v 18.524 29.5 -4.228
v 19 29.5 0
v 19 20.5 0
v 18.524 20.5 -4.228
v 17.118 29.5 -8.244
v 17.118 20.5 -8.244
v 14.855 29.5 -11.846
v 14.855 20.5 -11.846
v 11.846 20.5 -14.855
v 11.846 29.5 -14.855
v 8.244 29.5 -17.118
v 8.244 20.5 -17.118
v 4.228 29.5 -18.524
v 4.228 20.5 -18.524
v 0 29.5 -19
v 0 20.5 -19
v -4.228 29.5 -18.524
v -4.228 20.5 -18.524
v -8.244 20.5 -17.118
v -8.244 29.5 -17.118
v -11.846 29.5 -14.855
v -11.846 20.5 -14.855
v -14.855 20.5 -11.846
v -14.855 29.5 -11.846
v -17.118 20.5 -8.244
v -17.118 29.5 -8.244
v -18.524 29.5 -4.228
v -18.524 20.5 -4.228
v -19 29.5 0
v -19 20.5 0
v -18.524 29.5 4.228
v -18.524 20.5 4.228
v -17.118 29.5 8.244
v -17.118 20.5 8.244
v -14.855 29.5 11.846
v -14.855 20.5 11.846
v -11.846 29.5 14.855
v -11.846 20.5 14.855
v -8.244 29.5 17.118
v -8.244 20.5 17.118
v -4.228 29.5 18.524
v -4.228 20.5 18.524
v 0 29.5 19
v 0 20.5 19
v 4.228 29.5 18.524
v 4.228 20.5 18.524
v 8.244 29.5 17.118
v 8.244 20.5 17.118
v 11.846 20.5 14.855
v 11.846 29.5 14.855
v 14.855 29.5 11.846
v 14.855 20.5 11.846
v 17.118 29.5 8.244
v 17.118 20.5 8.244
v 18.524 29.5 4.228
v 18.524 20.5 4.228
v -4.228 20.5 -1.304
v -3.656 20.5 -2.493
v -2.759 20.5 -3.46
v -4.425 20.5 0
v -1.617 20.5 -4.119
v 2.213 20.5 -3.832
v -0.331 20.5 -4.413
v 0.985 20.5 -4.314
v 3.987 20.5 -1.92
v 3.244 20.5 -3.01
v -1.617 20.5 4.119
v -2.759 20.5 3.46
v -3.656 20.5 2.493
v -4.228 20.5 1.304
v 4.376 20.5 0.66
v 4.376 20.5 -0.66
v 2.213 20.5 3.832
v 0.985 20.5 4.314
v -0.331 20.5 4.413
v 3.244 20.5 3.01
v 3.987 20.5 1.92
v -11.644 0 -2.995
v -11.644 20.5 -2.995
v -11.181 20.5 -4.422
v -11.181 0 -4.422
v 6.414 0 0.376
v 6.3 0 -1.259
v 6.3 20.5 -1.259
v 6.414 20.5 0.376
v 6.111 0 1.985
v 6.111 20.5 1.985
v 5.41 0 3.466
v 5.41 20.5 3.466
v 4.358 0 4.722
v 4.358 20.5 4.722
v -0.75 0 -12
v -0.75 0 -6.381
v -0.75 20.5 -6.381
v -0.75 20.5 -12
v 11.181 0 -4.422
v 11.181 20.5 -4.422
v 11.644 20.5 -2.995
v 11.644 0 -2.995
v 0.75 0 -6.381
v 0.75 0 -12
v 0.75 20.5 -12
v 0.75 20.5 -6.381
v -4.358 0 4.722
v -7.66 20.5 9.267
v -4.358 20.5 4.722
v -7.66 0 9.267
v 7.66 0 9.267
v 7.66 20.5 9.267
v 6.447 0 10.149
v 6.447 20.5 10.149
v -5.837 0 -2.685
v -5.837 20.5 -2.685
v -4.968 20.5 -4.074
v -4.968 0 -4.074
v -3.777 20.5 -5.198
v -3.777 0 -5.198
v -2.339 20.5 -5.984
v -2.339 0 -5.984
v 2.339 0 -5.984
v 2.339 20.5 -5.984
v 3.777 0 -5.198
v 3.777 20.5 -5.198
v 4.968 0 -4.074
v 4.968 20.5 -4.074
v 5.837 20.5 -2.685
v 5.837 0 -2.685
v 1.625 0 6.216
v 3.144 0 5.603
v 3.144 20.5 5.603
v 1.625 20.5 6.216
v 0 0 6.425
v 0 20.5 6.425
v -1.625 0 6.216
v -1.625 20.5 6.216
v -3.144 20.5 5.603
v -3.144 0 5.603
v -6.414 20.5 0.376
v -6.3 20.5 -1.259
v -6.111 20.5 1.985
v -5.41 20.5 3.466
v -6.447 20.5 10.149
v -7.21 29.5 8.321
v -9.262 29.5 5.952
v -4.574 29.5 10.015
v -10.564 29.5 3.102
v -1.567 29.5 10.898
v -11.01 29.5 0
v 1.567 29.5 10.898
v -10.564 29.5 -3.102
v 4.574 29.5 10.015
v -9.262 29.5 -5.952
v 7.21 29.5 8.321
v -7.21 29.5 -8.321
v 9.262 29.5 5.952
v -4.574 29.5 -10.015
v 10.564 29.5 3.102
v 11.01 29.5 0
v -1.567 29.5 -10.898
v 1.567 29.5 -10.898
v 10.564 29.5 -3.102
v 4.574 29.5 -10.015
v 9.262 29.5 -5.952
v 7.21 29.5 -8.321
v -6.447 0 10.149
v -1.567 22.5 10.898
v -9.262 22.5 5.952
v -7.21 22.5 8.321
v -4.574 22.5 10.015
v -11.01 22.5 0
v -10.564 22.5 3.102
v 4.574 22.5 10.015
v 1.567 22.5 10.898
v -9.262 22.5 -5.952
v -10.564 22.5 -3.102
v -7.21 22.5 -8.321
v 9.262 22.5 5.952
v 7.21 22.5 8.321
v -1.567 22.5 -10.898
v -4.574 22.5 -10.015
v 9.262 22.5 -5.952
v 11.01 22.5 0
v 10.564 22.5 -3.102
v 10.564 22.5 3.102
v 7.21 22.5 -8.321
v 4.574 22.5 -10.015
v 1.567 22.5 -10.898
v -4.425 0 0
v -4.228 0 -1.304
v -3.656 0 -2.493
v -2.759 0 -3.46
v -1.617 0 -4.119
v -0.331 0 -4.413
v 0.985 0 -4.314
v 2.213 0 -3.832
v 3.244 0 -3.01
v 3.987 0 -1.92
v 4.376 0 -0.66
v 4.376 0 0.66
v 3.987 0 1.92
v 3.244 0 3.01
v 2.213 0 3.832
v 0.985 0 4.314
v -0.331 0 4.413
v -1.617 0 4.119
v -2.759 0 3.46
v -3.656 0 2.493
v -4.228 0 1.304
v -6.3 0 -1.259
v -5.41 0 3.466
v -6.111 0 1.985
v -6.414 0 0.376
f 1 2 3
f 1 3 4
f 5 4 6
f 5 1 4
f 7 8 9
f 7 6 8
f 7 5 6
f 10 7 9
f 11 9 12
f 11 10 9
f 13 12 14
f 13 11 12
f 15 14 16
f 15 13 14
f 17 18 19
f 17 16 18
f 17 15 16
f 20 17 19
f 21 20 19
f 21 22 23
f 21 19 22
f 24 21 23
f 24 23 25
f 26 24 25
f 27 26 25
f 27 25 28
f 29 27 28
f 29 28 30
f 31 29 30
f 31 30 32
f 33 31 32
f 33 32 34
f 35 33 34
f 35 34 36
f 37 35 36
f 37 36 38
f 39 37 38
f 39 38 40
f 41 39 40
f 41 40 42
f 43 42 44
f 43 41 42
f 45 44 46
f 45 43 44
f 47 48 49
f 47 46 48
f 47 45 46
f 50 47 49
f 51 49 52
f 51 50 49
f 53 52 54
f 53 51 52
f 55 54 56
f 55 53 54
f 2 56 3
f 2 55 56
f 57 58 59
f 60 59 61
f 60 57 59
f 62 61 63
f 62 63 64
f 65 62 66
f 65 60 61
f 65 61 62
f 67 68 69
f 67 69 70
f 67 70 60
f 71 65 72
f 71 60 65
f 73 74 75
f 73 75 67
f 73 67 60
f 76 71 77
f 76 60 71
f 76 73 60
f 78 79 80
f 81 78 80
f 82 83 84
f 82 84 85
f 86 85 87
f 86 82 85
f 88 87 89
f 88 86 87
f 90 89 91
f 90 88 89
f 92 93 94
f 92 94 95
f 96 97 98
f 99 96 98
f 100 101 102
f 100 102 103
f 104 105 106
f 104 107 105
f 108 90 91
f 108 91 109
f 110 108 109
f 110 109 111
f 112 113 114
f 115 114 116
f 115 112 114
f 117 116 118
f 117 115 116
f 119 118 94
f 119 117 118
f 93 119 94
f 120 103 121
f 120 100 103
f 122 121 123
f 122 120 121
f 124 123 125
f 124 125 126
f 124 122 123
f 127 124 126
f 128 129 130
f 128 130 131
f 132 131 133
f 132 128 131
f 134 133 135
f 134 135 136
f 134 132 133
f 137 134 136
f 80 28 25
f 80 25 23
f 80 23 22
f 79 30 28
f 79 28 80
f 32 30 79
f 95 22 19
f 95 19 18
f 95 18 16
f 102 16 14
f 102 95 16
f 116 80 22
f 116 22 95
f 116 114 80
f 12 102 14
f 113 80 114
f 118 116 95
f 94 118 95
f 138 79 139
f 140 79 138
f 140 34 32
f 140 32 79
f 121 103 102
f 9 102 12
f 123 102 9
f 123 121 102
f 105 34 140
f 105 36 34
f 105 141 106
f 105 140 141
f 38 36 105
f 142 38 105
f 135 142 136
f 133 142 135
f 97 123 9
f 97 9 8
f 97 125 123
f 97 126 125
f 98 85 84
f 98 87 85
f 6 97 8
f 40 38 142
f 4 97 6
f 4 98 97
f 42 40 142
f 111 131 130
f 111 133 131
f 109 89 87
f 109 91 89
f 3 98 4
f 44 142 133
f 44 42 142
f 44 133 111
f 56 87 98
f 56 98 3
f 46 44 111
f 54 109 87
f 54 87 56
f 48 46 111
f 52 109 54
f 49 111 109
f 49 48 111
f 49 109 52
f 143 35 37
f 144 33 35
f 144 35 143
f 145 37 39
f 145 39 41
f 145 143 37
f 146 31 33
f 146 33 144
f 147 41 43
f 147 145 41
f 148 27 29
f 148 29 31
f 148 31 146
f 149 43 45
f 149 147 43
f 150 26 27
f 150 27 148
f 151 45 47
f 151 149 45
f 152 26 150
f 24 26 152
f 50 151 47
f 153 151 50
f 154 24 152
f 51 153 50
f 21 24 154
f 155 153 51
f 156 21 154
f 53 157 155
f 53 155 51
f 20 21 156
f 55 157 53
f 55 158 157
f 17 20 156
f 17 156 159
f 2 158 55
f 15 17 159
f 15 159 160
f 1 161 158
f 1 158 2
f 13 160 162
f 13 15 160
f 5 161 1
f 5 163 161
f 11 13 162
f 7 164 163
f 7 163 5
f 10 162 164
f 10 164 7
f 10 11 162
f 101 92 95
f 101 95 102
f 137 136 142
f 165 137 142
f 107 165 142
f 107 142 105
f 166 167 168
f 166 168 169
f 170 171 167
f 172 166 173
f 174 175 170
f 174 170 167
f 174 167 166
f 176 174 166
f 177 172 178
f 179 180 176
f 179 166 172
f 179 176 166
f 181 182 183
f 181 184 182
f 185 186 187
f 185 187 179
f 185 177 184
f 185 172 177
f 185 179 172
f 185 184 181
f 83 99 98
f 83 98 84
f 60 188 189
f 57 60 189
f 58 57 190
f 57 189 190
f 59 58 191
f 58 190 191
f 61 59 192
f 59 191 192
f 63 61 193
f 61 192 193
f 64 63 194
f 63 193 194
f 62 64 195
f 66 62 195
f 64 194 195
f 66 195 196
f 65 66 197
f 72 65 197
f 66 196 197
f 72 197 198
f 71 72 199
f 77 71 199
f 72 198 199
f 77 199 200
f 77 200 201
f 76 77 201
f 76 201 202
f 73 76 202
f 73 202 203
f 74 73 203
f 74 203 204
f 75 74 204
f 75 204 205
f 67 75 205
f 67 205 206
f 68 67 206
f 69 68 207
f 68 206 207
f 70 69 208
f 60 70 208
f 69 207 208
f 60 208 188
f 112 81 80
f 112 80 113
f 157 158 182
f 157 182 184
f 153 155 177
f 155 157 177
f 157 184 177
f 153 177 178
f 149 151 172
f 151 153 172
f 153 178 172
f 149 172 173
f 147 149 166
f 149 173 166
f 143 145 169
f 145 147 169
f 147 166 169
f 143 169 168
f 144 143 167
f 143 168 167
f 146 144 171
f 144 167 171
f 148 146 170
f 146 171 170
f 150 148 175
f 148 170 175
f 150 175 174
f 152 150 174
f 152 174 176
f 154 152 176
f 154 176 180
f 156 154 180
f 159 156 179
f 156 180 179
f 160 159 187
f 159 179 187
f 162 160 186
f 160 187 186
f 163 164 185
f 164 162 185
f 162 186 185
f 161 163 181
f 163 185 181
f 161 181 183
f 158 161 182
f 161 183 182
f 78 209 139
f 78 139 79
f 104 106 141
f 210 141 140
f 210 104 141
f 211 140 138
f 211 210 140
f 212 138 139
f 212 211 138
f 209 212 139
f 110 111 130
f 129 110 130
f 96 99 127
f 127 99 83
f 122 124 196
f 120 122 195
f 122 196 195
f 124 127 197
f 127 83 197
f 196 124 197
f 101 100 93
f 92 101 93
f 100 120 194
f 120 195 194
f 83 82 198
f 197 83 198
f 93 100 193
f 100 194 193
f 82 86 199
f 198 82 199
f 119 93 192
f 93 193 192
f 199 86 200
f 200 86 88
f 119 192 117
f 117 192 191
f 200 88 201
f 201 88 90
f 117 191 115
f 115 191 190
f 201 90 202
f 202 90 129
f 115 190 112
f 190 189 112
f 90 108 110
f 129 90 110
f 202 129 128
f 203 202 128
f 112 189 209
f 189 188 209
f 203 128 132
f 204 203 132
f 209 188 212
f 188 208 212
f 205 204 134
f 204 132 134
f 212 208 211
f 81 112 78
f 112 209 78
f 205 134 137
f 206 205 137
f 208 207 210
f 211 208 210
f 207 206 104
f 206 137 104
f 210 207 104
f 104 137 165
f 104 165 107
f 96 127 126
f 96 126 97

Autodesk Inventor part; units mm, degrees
ref_plane "YZ Plane" through (0, 0, 0) normal (1, 0, 0) x (0, 1, 0)
ref_plane "XZ Plane" through (0, 0, 0) normal (0, 1, 0) x (-1, 0, 0)
ref_plane "XY Plane" through (0, 0, 0) normal (0, 0, 1) x (1, 0, 0)
sketch "Sketch1" plane through (0, 0, 0) normal (0, 1, 0) x (-1, 0, 0)
  circle A0 centre (0, 0) radius 4.425
  line L0 (-11.1809, -4.4215) -> (-11.6444, -2.9949)
  line L1 (-11.6444, -2.9949) -> (-6.3005, -1.2586)
  arc A1 (-4.3575, 4.7216) -> (-6.3005, -1.2586) centre (0, 0) ccw
  line L2 (-4.3575, 4.7216) -> (-7.6602, 9.2674)
  line L3 (-7.6602, 9.2674) -> (-6.4467, 10.149)
  line L4 (-6.4467, 10.149) -> (-3.1439, 5.6032)
  arc A2 (3.1439, 5.6032) -> (-3.1439, 5.6032) centre (0, 0) ccw
  line L5 (3.1439, 5.6032) -> (6.4467, 10.149)
  line L6 (6.4467, 10.149) -> (7.6602, 9.2674)
  line L7 (7.6602, 9.2674) -> (4.3575, 4.7216)
  arc A3 (6.3005, -1.2586) -> (4.3575, 4.7216) centre (0, 0) ccw
  line L8 (6.3005, -1.2586) -> (11.6444, -2.9949)
  line L9 (11.6444, -2.9949) -> (11.1809, -4.4215)
  line L10 (11.1809, -4.4215) -> (5.837, -2.6852)
  arc A4 (0.75, -6.3811) -> (5.837, -2.6852) centre (0, 0) ccw
  line L11 (0.75, -6.3811) -> (0.75, -12)
  line L12 (0.75, -12) -> (-0.75, -12)
  line L13 (-0.75, -12) -> (-0.75, -6.3811)
  arc A5 (-5.837, -2.6852) -> (-0.75, -6.3811) centre (0, 0) ccw
  line L14 (-5.837, -2.6852) -> (-11.1809, -4.4215)
extrude "Extrusion1" add sketch "Sketch1" along normal blind 21
sketch "Sketch2" plane through (0, 21, 0) normal (0, 1, 0) x (1, 0, 0)
  circle A0 centre (0, 0) radius 11.01
  circle A1 centre (0, 0) radius 19
  dimension "d2" = 38
extrude "Extrusion2" add sketch "Sketch2" along normal blind 8.5
sketch "Sketch3" plane through (0, 21, 0) normal (0, 1, 0) x (1, 0, 0)
  circle A0 centre (0, 0) radius 11.01
extrude "Extrusion3" add sketch "Sketch3" along normal blind 1.5
sketch "Sketch4" plane through (0, 21, 0) normal (0, -1, 0) x (1, 0, 0)
  circle A0 centre (0, 0) radius 19
  dimension "d7" = 38
extrude "Extrusion4" add sketch "Sketch4" along normal blind 0.5
properties part number "eje rodaje b"
